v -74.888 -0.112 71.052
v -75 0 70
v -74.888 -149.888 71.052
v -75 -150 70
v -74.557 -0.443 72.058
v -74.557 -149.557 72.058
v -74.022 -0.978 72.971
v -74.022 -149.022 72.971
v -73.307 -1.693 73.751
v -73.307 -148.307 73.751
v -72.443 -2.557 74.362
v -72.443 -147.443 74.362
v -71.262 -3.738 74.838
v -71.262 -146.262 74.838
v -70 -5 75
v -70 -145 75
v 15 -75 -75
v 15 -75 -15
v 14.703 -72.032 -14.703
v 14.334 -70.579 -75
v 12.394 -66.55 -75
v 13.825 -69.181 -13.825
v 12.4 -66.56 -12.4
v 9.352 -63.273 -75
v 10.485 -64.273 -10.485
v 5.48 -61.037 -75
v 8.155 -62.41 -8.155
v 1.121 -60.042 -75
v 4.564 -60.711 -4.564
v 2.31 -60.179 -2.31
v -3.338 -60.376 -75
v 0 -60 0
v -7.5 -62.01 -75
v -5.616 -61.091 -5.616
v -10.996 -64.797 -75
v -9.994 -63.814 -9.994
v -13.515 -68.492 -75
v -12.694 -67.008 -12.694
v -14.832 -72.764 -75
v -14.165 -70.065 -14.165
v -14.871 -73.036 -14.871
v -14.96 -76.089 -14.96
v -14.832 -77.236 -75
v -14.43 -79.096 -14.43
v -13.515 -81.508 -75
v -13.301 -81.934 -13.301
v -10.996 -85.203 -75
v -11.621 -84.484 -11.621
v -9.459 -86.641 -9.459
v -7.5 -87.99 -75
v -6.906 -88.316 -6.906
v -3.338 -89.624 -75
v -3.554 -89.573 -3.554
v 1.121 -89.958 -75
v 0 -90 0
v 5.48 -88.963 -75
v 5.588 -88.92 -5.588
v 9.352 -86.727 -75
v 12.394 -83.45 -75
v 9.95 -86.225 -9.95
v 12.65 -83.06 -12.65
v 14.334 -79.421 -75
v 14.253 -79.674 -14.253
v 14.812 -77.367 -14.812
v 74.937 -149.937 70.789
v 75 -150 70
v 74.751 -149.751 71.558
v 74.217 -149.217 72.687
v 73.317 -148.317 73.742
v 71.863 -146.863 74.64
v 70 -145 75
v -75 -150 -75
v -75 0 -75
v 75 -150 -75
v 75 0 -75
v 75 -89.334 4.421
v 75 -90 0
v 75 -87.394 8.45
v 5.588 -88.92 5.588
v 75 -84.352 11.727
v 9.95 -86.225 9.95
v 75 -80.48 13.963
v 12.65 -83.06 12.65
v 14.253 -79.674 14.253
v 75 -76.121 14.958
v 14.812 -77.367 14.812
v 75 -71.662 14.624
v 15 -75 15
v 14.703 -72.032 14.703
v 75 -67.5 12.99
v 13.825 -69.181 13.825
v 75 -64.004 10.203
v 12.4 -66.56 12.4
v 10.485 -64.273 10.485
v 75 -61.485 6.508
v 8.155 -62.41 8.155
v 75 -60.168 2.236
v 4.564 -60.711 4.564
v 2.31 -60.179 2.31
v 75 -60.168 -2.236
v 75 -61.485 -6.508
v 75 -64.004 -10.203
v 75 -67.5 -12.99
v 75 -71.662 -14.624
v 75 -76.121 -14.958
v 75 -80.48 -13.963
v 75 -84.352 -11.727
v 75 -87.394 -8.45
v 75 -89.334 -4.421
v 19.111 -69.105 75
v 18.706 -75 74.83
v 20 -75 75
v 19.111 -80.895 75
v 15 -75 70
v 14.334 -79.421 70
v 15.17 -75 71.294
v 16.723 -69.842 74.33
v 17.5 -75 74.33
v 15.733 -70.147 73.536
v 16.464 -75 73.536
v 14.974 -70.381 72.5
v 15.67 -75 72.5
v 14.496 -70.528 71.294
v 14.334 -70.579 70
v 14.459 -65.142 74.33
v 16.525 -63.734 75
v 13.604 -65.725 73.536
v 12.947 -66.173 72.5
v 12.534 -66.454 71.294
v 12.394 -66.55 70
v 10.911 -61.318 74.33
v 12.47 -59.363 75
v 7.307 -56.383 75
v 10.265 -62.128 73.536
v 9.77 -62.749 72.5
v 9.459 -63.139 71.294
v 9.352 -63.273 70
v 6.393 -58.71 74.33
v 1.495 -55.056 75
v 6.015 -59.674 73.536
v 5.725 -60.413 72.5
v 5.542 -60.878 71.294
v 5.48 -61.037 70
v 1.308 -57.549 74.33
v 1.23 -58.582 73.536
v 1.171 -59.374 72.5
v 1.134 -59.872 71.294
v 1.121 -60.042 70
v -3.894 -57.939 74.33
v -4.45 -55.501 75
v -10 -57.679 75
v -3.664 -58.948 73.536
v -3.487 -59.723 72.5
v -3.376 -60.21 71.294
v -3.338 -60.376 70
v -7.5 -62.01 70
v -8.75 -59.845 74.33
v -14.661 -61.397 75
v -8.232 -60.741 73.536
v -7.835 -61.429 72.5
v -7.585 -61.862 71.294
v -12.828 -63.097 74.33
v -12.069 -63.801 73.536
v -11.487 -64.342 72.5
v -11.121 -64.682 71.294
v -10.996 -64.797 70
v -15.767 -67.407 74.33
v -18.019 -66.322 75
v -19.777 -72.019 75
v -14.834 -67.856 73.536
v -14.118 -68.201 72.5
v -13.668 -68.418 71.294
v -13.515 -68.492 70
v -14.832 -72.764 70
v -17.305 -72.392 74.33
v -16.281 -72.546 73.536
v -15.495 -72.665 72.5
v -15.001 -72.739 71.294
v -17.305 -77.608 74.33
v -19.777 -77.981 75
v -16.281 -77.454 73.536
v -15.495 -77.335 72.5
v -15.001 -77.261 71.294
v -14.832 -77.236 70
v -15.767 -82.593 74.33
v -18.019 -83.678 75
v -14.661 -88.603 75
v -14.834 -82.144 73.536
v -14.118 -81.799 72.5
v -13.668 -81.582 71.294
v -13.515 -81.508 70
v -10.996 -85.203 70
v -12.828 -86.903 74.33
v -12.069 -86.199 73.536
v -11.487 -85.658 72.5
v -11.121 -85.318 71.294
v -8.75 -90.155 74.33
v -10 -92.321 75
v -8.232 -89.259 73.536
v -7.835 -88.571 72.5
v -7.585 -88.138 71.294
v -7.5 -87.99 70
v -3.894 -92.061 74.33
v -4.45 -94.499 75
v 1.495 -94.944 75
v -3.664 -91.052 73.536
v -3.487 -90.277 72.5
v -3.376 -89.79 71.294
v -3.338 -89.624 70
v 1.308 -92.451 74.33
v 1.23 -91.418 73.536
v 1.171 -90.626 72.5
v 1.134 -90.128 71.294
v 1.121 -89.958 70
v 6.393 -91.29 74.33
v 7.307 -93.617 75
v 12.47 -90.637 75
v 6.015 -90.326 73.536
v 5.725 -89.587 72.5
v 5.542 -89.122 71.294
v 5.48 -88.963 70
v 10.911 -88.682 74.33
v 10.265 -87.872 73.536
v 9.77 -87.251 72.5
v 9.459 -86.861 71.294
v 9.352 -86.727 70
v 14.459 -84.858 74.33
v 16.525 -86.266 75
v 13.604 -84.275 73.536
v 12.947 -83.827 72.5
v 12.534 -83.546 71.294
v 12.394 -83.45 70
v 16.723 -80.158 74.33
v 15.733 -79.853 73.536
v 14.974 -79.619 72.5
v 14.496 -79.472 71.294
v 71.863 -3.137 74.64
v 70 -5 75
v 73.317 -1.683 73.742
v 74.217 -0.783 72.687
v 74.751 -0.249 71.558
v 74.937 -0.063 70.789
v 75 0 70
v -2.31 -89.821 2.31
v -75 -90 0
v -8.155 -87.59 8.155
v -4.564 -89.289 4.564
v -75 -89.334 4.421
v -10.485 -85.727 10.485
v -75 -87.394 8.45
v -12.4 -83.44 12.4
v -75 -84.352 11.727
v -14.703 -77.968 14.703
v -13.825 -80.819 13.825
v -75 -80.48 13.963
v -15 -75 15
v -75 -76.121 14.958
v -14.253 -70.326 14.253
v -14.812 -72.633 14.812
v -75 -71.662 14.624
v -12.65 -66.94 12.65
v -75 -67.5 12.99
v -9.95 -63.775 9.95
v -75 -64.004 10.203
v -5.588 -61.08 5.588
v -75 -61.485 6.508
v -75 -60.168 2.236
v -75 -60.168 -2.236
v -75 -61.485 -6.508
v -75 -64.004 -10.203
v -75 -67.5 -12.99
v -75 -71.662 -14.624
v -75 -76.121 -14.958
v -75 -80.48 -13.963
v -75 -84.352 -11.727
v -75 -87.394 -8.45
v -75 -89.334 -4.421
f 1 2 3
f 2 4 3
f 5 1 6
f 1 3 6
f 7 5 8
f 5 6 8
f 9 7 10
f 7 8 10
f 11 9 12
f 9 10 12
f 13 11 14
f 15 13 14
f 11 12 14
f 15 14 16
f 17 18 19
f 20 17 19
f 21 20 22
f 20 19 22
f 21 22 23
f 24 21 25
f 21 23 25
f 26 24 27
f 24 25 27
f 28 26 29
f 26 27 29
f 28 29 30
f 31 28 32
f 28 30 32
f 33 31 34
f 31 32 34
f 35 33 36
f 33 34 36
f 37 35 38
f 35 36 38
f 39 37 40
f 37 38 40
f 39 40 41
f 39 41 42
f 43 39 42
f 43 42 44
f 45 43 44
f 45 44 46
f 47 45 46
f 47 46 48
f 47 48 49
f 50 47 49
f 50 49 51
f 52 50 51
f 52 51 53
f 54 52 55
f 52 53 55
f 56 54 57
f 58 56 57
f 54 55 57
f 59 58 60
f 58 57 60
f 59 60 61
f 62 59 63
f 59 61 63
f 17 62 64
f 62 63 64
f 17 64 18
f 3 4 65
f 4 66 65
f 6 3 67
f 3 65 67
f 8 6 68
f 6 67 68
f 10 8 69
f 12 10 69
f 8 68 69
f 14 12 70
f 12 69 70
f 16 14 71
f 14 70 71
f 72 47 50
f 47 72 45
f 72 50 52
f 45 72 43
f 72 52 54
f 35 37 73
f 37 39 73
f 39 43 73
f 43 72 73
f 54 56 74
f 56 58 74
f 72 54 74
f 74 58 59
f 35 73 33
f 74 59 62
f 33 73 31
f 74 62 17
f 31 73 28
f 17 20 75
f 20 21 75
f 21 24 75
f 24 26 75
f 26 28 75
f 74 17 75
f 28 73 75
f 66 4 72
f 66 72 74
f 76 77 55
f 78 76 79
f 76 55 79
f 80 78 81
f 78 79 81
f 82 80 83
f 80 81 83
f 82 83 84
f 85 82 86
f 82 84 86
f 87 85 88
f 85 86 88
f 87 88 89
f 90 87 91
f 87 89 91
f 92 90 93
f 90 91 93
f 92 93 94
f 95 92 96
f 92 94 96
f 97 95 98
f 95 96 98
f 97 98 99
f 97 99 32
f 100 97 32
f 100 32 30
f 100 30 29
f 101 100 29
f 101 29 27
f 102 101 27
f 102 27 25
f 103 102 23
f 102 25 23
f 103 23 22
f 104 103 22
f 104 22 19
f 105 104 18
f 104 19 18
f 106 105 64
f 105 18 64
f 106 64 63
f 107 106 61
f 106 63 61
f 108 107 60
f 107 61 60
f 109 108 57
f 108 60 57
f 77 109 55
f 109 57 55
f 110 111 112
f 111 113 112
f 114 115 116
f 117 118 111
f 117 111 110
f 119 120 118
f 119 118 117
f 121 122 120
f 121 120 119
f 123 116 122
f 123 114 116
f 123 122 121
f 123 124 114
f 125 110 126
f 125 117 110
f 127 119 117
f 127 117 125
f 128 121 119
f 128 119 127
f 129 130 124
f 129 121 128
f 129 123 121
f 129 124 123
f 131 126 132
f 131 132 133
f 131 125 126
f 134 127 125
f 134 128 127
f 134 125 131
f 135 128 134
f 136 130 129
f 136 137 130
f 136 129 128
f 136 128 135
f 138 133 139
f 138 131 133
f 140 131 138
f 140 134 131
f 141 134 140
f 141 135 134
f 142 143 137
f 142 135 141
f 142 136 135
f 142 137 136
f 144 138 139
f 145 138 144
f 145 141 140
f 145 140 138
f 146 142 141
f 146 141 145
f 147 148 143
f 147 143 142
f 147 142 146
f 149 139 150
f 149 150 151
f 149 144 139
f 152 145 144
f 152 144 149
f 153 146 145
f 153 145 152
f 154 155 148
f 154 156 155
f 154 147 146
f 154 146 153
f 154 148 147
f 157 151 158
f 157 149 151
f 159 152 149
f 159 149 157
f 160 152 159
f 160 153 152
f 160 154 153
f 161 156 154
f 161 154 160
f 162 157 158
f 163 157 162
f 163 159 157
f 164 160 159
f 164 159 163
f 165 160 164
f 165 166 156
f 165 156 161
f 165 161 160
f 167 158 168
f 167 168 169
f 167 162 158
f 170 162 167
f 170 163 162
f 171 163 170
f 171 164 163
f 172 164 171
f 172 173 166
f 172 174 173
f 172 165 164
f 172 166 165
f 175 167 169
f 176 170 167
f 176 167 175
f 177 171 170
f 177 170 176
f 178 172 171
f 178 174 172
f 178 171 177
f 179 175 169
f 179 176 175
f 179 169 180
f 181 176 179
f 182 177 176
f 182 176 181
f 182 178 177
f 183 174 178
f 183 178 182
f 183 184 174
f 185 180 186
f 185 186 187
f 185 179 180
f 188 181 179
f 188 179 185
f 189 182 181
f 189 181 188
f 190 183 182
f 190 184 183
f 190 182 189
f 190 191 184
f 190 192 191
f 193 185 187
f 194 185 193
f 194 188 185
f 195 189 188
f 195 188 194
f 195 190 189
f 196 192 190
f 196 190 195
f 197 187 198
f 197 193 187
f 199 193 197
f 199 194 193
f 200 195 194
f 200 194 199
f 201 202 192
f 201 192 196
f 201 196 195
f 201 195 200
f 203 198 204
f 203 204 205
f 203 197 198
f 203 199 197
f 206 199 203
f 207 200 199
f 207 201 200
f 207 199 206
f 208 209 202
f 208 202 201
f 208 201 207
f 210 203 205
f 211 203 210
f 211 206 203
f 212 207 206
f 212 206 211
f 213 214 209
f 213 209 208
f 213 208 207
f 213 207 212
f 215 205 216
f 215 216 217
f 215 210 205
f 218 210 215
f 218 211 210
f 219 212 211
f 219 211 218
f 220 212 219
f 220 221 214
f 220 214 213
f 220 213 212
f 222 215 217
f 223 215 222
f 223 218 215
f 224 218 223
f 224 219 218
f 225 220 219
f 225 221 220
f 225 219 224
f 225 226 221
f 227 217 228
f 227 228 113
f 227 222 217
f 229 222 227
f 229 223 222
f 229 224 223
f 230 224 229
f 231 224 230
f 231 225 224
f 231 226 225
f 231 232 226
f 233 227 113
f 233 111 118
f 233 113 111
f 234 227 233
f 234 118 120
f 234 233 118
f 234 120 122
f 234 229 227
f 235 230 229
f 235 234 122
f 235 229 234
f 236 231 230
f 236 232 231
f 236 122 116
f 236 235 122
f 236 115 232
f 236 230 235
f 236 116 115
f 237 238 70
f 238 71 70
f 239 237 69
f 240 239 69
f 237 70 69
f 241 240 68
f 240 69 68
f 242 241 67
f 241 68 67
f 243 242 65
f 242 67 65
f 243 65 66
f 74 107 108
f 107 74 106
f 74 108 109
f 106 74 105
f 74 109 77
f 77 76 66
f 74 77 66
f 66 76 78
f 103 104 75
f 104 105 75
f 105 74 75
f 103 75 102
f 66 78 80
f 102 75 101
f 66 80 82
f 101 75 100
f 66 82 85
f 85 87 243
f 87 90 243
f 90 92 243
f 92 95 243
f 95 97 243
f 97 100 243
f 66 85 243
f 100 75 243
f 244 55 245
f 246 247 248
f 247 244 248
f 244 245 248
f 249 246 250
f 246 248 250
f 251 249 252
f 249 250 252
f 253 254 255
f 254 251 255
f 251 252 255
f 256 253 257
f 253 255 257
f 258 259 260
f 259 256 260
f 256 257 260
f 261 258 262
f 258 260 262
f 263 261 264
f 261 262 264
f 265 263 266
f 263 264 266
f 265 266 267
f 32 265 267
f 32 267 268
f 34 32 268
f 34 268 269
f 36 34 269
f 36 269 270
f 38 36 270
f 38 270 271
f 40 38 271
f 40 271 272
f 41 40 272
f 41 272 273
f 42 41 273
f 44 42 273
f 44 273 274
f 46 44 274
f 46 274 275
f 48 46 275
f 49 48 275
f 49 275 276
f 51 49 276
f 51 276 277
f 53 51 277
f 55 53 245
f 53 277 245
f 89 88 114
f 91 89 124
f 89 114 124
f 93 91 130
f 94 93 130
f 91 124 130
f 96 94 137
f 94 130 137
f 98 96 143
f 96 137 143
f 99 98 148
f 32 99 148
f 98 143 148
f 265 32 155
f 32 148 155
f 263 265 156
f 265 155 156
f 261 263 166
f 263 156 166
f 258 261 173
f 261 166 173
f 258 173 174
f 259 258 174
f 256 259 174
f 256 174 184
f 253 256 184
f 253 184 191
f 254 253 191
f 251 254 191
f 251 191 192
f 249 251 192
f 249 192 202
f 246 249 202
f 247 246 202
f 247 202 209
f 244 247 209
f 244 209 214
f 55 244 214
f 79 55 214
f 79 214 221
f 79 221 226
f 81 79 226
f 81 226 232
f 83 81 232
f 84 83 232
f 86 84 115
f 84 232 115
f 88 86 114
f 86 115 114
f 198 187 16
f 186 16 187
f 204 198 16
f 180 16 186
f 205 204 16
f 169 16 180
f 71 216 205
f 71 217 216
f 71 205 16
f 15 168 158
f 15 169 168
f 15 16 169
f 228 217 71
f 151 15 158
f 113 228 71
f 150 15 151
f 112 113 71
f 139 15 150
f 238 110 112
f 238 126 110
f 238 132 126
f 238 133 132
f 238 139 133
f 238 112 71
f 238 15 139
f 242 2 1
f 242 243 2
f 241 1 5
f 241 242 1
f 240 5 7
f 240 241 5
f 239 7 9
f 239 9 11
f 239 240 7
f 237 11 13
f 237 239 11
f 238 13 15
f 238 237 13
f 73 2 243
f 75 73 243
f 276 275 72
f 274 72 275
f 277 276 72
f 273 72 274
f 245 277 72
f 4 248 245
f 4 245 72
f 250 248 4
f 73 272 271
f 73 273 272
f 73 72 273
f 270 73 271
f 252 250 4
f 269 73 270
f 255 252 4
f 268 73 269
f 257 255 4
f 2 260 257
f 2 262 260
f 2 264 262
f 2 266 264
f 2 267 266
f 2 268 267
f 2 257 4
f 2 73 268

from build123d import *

# Parameters (mm, degrees)
F0_W     = 150
F0_H     = 150
F1_DEPTH = 150
F2_R     = 15
F3_DEPTH = 150
F4_R     = 15
F5_DEPTH = 150
F6_R     = 5


with BuildPart() as f1:
    # F0 (on Front) → F1 (new body)
    with BuildSketch(Plane.XZ):
        Rectangle(F0_W, F0_H)
    extrude(amount=F1_DEPTH)

    # F2 (on face) → F3 (cut)
    with BuildSketch(Plane.XY.offset(75)):
        with Locations((0, -75)):
            Circle(F2_R)
    extrude(amount=-F3_DEPTH, mode=Mode.SUBTRACT)

    # F4 (on face) → F5 (cut)
    with BuildSketch(Plane(origin=(-75, 0, 0), x_dir=(0, -1, 0), z_dir=(-1, 0, 0))):
        with Locations((75, 0)):
            Circle(F4_R)
    extrude(amount=-F5_DEPTH, mode=Mode.SUBTRACT)

    # F6
    f6_edges = [f1.edges().sort_by_distance(p)[0] for p in [
        (75, -75, 75),
        (0, 0, 75),
        (0, -150, 75),
        (-75, -75, 75),
        (-15, -75, 75),
    ]]
    fillet(f6_edges, radius=F6_R)


solid = f1.part
